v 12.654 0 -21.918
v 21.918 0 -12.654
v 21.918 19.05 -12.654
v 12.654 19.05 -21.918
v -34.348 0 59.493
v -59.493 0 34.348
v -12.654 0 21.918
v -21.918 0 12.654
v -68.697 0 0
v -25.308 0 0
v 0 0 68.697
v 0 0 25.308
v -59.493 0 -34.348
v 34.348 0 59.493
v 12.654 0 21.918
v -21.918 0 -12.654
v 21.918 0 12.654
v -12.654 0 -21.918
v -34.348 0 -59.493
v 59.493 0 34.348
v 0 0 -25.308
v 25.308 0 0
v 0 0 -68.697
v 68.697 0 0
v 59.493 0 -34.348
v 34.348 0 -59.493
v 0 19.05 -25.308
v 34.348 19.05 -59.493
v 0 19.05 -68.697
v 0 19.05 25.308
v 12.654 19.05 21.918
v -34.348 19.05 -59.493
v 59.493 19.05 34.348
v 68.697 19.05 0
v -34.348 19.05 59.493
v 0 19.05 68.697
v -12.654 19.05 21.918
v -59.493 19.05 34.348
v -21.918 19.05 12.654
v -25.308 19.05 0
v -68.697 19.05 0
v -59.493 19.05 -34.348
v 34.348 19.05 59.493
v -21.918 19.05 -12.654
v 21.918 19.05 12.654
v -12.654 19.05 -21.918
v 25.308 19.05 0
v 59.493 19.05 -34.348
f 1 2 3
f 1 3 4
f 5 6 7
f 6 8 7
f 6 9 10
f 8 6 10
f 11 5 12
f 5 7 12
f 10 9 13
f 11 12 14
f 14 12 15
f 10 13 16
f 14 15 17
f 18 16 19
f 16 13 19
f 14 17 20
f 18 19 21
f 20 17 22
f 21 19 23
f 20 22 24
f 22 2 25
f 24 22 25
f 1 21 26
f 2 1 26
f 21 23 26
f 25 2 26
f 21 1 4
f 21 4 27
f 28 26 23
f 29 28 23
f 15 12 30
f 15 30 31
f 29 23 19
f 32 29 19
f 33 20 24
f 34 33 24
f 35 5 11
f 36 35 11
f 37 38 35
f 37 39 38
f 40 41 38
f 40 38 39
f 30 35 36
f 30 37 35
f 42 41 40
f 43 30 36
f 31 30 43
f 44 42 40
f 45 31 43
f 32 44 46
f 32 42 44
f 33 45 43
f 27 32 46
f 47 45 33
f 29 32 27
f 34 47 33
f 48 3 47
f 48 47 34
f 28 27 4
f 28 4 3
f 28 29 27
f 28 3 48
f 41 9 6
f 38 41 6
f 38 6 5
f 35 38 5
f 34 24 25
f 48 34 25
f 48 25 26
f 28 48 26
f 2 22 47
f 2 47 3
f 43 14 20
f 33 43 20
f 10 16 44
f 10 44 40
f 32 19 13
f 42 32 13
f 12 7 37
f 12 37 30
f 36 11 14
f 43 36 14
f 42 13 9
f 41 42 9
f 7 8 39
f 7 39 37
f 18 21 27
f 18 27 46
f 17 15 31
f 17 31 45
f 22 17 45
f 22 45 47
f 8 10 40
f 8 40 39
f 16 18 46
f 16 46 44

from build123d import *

# Parameters (mm, degrees)
BOSS_EXTRUDE1_DEPTH = 19.05


with BuildPart() as part:
    # Sketch1 → Boss-Extrude1 (new body)
    with BuildSketch(Plane(origin=(0, 0, 0), x_dir=(1, 0, 0), z_dir=(0, 1, 0))):
        Polygon((68.696644766, 0), (59.493039522, 34.348322383), (34.348322383, 59.493039522), (0, 68.696644766), (-34.348322383, 59.493039522), (-59.493039522, 34.348322383), (-68.696644766, 0), (-59.493039522, -34.348322383), (-34.348322383, -59.493039522), (0, -68.696644766), (34.348322383, -59.493039522), (59.493039522, -34.348322383), align=None)
        Polygon((25.308220045, 0), (21.917561483, 12.654110022), (12.654110022, 21.917561483), (0, 25.308220045), (-12.654110022, 21.917561483), (-21.917561483, 12.654110022), (-25.308220045, 0), (-21.917561483, -12.654110022), (-12.654110022, -21.917561483), (0, -25.308220045), (12.654110022, -21.917561483), (21.917561483, -12.654110022), align=None, mode=Mode.SUBTRACT)
    extrude(amount=BOSS_EXTRUDE1_DEPTH)


solid = part.part
